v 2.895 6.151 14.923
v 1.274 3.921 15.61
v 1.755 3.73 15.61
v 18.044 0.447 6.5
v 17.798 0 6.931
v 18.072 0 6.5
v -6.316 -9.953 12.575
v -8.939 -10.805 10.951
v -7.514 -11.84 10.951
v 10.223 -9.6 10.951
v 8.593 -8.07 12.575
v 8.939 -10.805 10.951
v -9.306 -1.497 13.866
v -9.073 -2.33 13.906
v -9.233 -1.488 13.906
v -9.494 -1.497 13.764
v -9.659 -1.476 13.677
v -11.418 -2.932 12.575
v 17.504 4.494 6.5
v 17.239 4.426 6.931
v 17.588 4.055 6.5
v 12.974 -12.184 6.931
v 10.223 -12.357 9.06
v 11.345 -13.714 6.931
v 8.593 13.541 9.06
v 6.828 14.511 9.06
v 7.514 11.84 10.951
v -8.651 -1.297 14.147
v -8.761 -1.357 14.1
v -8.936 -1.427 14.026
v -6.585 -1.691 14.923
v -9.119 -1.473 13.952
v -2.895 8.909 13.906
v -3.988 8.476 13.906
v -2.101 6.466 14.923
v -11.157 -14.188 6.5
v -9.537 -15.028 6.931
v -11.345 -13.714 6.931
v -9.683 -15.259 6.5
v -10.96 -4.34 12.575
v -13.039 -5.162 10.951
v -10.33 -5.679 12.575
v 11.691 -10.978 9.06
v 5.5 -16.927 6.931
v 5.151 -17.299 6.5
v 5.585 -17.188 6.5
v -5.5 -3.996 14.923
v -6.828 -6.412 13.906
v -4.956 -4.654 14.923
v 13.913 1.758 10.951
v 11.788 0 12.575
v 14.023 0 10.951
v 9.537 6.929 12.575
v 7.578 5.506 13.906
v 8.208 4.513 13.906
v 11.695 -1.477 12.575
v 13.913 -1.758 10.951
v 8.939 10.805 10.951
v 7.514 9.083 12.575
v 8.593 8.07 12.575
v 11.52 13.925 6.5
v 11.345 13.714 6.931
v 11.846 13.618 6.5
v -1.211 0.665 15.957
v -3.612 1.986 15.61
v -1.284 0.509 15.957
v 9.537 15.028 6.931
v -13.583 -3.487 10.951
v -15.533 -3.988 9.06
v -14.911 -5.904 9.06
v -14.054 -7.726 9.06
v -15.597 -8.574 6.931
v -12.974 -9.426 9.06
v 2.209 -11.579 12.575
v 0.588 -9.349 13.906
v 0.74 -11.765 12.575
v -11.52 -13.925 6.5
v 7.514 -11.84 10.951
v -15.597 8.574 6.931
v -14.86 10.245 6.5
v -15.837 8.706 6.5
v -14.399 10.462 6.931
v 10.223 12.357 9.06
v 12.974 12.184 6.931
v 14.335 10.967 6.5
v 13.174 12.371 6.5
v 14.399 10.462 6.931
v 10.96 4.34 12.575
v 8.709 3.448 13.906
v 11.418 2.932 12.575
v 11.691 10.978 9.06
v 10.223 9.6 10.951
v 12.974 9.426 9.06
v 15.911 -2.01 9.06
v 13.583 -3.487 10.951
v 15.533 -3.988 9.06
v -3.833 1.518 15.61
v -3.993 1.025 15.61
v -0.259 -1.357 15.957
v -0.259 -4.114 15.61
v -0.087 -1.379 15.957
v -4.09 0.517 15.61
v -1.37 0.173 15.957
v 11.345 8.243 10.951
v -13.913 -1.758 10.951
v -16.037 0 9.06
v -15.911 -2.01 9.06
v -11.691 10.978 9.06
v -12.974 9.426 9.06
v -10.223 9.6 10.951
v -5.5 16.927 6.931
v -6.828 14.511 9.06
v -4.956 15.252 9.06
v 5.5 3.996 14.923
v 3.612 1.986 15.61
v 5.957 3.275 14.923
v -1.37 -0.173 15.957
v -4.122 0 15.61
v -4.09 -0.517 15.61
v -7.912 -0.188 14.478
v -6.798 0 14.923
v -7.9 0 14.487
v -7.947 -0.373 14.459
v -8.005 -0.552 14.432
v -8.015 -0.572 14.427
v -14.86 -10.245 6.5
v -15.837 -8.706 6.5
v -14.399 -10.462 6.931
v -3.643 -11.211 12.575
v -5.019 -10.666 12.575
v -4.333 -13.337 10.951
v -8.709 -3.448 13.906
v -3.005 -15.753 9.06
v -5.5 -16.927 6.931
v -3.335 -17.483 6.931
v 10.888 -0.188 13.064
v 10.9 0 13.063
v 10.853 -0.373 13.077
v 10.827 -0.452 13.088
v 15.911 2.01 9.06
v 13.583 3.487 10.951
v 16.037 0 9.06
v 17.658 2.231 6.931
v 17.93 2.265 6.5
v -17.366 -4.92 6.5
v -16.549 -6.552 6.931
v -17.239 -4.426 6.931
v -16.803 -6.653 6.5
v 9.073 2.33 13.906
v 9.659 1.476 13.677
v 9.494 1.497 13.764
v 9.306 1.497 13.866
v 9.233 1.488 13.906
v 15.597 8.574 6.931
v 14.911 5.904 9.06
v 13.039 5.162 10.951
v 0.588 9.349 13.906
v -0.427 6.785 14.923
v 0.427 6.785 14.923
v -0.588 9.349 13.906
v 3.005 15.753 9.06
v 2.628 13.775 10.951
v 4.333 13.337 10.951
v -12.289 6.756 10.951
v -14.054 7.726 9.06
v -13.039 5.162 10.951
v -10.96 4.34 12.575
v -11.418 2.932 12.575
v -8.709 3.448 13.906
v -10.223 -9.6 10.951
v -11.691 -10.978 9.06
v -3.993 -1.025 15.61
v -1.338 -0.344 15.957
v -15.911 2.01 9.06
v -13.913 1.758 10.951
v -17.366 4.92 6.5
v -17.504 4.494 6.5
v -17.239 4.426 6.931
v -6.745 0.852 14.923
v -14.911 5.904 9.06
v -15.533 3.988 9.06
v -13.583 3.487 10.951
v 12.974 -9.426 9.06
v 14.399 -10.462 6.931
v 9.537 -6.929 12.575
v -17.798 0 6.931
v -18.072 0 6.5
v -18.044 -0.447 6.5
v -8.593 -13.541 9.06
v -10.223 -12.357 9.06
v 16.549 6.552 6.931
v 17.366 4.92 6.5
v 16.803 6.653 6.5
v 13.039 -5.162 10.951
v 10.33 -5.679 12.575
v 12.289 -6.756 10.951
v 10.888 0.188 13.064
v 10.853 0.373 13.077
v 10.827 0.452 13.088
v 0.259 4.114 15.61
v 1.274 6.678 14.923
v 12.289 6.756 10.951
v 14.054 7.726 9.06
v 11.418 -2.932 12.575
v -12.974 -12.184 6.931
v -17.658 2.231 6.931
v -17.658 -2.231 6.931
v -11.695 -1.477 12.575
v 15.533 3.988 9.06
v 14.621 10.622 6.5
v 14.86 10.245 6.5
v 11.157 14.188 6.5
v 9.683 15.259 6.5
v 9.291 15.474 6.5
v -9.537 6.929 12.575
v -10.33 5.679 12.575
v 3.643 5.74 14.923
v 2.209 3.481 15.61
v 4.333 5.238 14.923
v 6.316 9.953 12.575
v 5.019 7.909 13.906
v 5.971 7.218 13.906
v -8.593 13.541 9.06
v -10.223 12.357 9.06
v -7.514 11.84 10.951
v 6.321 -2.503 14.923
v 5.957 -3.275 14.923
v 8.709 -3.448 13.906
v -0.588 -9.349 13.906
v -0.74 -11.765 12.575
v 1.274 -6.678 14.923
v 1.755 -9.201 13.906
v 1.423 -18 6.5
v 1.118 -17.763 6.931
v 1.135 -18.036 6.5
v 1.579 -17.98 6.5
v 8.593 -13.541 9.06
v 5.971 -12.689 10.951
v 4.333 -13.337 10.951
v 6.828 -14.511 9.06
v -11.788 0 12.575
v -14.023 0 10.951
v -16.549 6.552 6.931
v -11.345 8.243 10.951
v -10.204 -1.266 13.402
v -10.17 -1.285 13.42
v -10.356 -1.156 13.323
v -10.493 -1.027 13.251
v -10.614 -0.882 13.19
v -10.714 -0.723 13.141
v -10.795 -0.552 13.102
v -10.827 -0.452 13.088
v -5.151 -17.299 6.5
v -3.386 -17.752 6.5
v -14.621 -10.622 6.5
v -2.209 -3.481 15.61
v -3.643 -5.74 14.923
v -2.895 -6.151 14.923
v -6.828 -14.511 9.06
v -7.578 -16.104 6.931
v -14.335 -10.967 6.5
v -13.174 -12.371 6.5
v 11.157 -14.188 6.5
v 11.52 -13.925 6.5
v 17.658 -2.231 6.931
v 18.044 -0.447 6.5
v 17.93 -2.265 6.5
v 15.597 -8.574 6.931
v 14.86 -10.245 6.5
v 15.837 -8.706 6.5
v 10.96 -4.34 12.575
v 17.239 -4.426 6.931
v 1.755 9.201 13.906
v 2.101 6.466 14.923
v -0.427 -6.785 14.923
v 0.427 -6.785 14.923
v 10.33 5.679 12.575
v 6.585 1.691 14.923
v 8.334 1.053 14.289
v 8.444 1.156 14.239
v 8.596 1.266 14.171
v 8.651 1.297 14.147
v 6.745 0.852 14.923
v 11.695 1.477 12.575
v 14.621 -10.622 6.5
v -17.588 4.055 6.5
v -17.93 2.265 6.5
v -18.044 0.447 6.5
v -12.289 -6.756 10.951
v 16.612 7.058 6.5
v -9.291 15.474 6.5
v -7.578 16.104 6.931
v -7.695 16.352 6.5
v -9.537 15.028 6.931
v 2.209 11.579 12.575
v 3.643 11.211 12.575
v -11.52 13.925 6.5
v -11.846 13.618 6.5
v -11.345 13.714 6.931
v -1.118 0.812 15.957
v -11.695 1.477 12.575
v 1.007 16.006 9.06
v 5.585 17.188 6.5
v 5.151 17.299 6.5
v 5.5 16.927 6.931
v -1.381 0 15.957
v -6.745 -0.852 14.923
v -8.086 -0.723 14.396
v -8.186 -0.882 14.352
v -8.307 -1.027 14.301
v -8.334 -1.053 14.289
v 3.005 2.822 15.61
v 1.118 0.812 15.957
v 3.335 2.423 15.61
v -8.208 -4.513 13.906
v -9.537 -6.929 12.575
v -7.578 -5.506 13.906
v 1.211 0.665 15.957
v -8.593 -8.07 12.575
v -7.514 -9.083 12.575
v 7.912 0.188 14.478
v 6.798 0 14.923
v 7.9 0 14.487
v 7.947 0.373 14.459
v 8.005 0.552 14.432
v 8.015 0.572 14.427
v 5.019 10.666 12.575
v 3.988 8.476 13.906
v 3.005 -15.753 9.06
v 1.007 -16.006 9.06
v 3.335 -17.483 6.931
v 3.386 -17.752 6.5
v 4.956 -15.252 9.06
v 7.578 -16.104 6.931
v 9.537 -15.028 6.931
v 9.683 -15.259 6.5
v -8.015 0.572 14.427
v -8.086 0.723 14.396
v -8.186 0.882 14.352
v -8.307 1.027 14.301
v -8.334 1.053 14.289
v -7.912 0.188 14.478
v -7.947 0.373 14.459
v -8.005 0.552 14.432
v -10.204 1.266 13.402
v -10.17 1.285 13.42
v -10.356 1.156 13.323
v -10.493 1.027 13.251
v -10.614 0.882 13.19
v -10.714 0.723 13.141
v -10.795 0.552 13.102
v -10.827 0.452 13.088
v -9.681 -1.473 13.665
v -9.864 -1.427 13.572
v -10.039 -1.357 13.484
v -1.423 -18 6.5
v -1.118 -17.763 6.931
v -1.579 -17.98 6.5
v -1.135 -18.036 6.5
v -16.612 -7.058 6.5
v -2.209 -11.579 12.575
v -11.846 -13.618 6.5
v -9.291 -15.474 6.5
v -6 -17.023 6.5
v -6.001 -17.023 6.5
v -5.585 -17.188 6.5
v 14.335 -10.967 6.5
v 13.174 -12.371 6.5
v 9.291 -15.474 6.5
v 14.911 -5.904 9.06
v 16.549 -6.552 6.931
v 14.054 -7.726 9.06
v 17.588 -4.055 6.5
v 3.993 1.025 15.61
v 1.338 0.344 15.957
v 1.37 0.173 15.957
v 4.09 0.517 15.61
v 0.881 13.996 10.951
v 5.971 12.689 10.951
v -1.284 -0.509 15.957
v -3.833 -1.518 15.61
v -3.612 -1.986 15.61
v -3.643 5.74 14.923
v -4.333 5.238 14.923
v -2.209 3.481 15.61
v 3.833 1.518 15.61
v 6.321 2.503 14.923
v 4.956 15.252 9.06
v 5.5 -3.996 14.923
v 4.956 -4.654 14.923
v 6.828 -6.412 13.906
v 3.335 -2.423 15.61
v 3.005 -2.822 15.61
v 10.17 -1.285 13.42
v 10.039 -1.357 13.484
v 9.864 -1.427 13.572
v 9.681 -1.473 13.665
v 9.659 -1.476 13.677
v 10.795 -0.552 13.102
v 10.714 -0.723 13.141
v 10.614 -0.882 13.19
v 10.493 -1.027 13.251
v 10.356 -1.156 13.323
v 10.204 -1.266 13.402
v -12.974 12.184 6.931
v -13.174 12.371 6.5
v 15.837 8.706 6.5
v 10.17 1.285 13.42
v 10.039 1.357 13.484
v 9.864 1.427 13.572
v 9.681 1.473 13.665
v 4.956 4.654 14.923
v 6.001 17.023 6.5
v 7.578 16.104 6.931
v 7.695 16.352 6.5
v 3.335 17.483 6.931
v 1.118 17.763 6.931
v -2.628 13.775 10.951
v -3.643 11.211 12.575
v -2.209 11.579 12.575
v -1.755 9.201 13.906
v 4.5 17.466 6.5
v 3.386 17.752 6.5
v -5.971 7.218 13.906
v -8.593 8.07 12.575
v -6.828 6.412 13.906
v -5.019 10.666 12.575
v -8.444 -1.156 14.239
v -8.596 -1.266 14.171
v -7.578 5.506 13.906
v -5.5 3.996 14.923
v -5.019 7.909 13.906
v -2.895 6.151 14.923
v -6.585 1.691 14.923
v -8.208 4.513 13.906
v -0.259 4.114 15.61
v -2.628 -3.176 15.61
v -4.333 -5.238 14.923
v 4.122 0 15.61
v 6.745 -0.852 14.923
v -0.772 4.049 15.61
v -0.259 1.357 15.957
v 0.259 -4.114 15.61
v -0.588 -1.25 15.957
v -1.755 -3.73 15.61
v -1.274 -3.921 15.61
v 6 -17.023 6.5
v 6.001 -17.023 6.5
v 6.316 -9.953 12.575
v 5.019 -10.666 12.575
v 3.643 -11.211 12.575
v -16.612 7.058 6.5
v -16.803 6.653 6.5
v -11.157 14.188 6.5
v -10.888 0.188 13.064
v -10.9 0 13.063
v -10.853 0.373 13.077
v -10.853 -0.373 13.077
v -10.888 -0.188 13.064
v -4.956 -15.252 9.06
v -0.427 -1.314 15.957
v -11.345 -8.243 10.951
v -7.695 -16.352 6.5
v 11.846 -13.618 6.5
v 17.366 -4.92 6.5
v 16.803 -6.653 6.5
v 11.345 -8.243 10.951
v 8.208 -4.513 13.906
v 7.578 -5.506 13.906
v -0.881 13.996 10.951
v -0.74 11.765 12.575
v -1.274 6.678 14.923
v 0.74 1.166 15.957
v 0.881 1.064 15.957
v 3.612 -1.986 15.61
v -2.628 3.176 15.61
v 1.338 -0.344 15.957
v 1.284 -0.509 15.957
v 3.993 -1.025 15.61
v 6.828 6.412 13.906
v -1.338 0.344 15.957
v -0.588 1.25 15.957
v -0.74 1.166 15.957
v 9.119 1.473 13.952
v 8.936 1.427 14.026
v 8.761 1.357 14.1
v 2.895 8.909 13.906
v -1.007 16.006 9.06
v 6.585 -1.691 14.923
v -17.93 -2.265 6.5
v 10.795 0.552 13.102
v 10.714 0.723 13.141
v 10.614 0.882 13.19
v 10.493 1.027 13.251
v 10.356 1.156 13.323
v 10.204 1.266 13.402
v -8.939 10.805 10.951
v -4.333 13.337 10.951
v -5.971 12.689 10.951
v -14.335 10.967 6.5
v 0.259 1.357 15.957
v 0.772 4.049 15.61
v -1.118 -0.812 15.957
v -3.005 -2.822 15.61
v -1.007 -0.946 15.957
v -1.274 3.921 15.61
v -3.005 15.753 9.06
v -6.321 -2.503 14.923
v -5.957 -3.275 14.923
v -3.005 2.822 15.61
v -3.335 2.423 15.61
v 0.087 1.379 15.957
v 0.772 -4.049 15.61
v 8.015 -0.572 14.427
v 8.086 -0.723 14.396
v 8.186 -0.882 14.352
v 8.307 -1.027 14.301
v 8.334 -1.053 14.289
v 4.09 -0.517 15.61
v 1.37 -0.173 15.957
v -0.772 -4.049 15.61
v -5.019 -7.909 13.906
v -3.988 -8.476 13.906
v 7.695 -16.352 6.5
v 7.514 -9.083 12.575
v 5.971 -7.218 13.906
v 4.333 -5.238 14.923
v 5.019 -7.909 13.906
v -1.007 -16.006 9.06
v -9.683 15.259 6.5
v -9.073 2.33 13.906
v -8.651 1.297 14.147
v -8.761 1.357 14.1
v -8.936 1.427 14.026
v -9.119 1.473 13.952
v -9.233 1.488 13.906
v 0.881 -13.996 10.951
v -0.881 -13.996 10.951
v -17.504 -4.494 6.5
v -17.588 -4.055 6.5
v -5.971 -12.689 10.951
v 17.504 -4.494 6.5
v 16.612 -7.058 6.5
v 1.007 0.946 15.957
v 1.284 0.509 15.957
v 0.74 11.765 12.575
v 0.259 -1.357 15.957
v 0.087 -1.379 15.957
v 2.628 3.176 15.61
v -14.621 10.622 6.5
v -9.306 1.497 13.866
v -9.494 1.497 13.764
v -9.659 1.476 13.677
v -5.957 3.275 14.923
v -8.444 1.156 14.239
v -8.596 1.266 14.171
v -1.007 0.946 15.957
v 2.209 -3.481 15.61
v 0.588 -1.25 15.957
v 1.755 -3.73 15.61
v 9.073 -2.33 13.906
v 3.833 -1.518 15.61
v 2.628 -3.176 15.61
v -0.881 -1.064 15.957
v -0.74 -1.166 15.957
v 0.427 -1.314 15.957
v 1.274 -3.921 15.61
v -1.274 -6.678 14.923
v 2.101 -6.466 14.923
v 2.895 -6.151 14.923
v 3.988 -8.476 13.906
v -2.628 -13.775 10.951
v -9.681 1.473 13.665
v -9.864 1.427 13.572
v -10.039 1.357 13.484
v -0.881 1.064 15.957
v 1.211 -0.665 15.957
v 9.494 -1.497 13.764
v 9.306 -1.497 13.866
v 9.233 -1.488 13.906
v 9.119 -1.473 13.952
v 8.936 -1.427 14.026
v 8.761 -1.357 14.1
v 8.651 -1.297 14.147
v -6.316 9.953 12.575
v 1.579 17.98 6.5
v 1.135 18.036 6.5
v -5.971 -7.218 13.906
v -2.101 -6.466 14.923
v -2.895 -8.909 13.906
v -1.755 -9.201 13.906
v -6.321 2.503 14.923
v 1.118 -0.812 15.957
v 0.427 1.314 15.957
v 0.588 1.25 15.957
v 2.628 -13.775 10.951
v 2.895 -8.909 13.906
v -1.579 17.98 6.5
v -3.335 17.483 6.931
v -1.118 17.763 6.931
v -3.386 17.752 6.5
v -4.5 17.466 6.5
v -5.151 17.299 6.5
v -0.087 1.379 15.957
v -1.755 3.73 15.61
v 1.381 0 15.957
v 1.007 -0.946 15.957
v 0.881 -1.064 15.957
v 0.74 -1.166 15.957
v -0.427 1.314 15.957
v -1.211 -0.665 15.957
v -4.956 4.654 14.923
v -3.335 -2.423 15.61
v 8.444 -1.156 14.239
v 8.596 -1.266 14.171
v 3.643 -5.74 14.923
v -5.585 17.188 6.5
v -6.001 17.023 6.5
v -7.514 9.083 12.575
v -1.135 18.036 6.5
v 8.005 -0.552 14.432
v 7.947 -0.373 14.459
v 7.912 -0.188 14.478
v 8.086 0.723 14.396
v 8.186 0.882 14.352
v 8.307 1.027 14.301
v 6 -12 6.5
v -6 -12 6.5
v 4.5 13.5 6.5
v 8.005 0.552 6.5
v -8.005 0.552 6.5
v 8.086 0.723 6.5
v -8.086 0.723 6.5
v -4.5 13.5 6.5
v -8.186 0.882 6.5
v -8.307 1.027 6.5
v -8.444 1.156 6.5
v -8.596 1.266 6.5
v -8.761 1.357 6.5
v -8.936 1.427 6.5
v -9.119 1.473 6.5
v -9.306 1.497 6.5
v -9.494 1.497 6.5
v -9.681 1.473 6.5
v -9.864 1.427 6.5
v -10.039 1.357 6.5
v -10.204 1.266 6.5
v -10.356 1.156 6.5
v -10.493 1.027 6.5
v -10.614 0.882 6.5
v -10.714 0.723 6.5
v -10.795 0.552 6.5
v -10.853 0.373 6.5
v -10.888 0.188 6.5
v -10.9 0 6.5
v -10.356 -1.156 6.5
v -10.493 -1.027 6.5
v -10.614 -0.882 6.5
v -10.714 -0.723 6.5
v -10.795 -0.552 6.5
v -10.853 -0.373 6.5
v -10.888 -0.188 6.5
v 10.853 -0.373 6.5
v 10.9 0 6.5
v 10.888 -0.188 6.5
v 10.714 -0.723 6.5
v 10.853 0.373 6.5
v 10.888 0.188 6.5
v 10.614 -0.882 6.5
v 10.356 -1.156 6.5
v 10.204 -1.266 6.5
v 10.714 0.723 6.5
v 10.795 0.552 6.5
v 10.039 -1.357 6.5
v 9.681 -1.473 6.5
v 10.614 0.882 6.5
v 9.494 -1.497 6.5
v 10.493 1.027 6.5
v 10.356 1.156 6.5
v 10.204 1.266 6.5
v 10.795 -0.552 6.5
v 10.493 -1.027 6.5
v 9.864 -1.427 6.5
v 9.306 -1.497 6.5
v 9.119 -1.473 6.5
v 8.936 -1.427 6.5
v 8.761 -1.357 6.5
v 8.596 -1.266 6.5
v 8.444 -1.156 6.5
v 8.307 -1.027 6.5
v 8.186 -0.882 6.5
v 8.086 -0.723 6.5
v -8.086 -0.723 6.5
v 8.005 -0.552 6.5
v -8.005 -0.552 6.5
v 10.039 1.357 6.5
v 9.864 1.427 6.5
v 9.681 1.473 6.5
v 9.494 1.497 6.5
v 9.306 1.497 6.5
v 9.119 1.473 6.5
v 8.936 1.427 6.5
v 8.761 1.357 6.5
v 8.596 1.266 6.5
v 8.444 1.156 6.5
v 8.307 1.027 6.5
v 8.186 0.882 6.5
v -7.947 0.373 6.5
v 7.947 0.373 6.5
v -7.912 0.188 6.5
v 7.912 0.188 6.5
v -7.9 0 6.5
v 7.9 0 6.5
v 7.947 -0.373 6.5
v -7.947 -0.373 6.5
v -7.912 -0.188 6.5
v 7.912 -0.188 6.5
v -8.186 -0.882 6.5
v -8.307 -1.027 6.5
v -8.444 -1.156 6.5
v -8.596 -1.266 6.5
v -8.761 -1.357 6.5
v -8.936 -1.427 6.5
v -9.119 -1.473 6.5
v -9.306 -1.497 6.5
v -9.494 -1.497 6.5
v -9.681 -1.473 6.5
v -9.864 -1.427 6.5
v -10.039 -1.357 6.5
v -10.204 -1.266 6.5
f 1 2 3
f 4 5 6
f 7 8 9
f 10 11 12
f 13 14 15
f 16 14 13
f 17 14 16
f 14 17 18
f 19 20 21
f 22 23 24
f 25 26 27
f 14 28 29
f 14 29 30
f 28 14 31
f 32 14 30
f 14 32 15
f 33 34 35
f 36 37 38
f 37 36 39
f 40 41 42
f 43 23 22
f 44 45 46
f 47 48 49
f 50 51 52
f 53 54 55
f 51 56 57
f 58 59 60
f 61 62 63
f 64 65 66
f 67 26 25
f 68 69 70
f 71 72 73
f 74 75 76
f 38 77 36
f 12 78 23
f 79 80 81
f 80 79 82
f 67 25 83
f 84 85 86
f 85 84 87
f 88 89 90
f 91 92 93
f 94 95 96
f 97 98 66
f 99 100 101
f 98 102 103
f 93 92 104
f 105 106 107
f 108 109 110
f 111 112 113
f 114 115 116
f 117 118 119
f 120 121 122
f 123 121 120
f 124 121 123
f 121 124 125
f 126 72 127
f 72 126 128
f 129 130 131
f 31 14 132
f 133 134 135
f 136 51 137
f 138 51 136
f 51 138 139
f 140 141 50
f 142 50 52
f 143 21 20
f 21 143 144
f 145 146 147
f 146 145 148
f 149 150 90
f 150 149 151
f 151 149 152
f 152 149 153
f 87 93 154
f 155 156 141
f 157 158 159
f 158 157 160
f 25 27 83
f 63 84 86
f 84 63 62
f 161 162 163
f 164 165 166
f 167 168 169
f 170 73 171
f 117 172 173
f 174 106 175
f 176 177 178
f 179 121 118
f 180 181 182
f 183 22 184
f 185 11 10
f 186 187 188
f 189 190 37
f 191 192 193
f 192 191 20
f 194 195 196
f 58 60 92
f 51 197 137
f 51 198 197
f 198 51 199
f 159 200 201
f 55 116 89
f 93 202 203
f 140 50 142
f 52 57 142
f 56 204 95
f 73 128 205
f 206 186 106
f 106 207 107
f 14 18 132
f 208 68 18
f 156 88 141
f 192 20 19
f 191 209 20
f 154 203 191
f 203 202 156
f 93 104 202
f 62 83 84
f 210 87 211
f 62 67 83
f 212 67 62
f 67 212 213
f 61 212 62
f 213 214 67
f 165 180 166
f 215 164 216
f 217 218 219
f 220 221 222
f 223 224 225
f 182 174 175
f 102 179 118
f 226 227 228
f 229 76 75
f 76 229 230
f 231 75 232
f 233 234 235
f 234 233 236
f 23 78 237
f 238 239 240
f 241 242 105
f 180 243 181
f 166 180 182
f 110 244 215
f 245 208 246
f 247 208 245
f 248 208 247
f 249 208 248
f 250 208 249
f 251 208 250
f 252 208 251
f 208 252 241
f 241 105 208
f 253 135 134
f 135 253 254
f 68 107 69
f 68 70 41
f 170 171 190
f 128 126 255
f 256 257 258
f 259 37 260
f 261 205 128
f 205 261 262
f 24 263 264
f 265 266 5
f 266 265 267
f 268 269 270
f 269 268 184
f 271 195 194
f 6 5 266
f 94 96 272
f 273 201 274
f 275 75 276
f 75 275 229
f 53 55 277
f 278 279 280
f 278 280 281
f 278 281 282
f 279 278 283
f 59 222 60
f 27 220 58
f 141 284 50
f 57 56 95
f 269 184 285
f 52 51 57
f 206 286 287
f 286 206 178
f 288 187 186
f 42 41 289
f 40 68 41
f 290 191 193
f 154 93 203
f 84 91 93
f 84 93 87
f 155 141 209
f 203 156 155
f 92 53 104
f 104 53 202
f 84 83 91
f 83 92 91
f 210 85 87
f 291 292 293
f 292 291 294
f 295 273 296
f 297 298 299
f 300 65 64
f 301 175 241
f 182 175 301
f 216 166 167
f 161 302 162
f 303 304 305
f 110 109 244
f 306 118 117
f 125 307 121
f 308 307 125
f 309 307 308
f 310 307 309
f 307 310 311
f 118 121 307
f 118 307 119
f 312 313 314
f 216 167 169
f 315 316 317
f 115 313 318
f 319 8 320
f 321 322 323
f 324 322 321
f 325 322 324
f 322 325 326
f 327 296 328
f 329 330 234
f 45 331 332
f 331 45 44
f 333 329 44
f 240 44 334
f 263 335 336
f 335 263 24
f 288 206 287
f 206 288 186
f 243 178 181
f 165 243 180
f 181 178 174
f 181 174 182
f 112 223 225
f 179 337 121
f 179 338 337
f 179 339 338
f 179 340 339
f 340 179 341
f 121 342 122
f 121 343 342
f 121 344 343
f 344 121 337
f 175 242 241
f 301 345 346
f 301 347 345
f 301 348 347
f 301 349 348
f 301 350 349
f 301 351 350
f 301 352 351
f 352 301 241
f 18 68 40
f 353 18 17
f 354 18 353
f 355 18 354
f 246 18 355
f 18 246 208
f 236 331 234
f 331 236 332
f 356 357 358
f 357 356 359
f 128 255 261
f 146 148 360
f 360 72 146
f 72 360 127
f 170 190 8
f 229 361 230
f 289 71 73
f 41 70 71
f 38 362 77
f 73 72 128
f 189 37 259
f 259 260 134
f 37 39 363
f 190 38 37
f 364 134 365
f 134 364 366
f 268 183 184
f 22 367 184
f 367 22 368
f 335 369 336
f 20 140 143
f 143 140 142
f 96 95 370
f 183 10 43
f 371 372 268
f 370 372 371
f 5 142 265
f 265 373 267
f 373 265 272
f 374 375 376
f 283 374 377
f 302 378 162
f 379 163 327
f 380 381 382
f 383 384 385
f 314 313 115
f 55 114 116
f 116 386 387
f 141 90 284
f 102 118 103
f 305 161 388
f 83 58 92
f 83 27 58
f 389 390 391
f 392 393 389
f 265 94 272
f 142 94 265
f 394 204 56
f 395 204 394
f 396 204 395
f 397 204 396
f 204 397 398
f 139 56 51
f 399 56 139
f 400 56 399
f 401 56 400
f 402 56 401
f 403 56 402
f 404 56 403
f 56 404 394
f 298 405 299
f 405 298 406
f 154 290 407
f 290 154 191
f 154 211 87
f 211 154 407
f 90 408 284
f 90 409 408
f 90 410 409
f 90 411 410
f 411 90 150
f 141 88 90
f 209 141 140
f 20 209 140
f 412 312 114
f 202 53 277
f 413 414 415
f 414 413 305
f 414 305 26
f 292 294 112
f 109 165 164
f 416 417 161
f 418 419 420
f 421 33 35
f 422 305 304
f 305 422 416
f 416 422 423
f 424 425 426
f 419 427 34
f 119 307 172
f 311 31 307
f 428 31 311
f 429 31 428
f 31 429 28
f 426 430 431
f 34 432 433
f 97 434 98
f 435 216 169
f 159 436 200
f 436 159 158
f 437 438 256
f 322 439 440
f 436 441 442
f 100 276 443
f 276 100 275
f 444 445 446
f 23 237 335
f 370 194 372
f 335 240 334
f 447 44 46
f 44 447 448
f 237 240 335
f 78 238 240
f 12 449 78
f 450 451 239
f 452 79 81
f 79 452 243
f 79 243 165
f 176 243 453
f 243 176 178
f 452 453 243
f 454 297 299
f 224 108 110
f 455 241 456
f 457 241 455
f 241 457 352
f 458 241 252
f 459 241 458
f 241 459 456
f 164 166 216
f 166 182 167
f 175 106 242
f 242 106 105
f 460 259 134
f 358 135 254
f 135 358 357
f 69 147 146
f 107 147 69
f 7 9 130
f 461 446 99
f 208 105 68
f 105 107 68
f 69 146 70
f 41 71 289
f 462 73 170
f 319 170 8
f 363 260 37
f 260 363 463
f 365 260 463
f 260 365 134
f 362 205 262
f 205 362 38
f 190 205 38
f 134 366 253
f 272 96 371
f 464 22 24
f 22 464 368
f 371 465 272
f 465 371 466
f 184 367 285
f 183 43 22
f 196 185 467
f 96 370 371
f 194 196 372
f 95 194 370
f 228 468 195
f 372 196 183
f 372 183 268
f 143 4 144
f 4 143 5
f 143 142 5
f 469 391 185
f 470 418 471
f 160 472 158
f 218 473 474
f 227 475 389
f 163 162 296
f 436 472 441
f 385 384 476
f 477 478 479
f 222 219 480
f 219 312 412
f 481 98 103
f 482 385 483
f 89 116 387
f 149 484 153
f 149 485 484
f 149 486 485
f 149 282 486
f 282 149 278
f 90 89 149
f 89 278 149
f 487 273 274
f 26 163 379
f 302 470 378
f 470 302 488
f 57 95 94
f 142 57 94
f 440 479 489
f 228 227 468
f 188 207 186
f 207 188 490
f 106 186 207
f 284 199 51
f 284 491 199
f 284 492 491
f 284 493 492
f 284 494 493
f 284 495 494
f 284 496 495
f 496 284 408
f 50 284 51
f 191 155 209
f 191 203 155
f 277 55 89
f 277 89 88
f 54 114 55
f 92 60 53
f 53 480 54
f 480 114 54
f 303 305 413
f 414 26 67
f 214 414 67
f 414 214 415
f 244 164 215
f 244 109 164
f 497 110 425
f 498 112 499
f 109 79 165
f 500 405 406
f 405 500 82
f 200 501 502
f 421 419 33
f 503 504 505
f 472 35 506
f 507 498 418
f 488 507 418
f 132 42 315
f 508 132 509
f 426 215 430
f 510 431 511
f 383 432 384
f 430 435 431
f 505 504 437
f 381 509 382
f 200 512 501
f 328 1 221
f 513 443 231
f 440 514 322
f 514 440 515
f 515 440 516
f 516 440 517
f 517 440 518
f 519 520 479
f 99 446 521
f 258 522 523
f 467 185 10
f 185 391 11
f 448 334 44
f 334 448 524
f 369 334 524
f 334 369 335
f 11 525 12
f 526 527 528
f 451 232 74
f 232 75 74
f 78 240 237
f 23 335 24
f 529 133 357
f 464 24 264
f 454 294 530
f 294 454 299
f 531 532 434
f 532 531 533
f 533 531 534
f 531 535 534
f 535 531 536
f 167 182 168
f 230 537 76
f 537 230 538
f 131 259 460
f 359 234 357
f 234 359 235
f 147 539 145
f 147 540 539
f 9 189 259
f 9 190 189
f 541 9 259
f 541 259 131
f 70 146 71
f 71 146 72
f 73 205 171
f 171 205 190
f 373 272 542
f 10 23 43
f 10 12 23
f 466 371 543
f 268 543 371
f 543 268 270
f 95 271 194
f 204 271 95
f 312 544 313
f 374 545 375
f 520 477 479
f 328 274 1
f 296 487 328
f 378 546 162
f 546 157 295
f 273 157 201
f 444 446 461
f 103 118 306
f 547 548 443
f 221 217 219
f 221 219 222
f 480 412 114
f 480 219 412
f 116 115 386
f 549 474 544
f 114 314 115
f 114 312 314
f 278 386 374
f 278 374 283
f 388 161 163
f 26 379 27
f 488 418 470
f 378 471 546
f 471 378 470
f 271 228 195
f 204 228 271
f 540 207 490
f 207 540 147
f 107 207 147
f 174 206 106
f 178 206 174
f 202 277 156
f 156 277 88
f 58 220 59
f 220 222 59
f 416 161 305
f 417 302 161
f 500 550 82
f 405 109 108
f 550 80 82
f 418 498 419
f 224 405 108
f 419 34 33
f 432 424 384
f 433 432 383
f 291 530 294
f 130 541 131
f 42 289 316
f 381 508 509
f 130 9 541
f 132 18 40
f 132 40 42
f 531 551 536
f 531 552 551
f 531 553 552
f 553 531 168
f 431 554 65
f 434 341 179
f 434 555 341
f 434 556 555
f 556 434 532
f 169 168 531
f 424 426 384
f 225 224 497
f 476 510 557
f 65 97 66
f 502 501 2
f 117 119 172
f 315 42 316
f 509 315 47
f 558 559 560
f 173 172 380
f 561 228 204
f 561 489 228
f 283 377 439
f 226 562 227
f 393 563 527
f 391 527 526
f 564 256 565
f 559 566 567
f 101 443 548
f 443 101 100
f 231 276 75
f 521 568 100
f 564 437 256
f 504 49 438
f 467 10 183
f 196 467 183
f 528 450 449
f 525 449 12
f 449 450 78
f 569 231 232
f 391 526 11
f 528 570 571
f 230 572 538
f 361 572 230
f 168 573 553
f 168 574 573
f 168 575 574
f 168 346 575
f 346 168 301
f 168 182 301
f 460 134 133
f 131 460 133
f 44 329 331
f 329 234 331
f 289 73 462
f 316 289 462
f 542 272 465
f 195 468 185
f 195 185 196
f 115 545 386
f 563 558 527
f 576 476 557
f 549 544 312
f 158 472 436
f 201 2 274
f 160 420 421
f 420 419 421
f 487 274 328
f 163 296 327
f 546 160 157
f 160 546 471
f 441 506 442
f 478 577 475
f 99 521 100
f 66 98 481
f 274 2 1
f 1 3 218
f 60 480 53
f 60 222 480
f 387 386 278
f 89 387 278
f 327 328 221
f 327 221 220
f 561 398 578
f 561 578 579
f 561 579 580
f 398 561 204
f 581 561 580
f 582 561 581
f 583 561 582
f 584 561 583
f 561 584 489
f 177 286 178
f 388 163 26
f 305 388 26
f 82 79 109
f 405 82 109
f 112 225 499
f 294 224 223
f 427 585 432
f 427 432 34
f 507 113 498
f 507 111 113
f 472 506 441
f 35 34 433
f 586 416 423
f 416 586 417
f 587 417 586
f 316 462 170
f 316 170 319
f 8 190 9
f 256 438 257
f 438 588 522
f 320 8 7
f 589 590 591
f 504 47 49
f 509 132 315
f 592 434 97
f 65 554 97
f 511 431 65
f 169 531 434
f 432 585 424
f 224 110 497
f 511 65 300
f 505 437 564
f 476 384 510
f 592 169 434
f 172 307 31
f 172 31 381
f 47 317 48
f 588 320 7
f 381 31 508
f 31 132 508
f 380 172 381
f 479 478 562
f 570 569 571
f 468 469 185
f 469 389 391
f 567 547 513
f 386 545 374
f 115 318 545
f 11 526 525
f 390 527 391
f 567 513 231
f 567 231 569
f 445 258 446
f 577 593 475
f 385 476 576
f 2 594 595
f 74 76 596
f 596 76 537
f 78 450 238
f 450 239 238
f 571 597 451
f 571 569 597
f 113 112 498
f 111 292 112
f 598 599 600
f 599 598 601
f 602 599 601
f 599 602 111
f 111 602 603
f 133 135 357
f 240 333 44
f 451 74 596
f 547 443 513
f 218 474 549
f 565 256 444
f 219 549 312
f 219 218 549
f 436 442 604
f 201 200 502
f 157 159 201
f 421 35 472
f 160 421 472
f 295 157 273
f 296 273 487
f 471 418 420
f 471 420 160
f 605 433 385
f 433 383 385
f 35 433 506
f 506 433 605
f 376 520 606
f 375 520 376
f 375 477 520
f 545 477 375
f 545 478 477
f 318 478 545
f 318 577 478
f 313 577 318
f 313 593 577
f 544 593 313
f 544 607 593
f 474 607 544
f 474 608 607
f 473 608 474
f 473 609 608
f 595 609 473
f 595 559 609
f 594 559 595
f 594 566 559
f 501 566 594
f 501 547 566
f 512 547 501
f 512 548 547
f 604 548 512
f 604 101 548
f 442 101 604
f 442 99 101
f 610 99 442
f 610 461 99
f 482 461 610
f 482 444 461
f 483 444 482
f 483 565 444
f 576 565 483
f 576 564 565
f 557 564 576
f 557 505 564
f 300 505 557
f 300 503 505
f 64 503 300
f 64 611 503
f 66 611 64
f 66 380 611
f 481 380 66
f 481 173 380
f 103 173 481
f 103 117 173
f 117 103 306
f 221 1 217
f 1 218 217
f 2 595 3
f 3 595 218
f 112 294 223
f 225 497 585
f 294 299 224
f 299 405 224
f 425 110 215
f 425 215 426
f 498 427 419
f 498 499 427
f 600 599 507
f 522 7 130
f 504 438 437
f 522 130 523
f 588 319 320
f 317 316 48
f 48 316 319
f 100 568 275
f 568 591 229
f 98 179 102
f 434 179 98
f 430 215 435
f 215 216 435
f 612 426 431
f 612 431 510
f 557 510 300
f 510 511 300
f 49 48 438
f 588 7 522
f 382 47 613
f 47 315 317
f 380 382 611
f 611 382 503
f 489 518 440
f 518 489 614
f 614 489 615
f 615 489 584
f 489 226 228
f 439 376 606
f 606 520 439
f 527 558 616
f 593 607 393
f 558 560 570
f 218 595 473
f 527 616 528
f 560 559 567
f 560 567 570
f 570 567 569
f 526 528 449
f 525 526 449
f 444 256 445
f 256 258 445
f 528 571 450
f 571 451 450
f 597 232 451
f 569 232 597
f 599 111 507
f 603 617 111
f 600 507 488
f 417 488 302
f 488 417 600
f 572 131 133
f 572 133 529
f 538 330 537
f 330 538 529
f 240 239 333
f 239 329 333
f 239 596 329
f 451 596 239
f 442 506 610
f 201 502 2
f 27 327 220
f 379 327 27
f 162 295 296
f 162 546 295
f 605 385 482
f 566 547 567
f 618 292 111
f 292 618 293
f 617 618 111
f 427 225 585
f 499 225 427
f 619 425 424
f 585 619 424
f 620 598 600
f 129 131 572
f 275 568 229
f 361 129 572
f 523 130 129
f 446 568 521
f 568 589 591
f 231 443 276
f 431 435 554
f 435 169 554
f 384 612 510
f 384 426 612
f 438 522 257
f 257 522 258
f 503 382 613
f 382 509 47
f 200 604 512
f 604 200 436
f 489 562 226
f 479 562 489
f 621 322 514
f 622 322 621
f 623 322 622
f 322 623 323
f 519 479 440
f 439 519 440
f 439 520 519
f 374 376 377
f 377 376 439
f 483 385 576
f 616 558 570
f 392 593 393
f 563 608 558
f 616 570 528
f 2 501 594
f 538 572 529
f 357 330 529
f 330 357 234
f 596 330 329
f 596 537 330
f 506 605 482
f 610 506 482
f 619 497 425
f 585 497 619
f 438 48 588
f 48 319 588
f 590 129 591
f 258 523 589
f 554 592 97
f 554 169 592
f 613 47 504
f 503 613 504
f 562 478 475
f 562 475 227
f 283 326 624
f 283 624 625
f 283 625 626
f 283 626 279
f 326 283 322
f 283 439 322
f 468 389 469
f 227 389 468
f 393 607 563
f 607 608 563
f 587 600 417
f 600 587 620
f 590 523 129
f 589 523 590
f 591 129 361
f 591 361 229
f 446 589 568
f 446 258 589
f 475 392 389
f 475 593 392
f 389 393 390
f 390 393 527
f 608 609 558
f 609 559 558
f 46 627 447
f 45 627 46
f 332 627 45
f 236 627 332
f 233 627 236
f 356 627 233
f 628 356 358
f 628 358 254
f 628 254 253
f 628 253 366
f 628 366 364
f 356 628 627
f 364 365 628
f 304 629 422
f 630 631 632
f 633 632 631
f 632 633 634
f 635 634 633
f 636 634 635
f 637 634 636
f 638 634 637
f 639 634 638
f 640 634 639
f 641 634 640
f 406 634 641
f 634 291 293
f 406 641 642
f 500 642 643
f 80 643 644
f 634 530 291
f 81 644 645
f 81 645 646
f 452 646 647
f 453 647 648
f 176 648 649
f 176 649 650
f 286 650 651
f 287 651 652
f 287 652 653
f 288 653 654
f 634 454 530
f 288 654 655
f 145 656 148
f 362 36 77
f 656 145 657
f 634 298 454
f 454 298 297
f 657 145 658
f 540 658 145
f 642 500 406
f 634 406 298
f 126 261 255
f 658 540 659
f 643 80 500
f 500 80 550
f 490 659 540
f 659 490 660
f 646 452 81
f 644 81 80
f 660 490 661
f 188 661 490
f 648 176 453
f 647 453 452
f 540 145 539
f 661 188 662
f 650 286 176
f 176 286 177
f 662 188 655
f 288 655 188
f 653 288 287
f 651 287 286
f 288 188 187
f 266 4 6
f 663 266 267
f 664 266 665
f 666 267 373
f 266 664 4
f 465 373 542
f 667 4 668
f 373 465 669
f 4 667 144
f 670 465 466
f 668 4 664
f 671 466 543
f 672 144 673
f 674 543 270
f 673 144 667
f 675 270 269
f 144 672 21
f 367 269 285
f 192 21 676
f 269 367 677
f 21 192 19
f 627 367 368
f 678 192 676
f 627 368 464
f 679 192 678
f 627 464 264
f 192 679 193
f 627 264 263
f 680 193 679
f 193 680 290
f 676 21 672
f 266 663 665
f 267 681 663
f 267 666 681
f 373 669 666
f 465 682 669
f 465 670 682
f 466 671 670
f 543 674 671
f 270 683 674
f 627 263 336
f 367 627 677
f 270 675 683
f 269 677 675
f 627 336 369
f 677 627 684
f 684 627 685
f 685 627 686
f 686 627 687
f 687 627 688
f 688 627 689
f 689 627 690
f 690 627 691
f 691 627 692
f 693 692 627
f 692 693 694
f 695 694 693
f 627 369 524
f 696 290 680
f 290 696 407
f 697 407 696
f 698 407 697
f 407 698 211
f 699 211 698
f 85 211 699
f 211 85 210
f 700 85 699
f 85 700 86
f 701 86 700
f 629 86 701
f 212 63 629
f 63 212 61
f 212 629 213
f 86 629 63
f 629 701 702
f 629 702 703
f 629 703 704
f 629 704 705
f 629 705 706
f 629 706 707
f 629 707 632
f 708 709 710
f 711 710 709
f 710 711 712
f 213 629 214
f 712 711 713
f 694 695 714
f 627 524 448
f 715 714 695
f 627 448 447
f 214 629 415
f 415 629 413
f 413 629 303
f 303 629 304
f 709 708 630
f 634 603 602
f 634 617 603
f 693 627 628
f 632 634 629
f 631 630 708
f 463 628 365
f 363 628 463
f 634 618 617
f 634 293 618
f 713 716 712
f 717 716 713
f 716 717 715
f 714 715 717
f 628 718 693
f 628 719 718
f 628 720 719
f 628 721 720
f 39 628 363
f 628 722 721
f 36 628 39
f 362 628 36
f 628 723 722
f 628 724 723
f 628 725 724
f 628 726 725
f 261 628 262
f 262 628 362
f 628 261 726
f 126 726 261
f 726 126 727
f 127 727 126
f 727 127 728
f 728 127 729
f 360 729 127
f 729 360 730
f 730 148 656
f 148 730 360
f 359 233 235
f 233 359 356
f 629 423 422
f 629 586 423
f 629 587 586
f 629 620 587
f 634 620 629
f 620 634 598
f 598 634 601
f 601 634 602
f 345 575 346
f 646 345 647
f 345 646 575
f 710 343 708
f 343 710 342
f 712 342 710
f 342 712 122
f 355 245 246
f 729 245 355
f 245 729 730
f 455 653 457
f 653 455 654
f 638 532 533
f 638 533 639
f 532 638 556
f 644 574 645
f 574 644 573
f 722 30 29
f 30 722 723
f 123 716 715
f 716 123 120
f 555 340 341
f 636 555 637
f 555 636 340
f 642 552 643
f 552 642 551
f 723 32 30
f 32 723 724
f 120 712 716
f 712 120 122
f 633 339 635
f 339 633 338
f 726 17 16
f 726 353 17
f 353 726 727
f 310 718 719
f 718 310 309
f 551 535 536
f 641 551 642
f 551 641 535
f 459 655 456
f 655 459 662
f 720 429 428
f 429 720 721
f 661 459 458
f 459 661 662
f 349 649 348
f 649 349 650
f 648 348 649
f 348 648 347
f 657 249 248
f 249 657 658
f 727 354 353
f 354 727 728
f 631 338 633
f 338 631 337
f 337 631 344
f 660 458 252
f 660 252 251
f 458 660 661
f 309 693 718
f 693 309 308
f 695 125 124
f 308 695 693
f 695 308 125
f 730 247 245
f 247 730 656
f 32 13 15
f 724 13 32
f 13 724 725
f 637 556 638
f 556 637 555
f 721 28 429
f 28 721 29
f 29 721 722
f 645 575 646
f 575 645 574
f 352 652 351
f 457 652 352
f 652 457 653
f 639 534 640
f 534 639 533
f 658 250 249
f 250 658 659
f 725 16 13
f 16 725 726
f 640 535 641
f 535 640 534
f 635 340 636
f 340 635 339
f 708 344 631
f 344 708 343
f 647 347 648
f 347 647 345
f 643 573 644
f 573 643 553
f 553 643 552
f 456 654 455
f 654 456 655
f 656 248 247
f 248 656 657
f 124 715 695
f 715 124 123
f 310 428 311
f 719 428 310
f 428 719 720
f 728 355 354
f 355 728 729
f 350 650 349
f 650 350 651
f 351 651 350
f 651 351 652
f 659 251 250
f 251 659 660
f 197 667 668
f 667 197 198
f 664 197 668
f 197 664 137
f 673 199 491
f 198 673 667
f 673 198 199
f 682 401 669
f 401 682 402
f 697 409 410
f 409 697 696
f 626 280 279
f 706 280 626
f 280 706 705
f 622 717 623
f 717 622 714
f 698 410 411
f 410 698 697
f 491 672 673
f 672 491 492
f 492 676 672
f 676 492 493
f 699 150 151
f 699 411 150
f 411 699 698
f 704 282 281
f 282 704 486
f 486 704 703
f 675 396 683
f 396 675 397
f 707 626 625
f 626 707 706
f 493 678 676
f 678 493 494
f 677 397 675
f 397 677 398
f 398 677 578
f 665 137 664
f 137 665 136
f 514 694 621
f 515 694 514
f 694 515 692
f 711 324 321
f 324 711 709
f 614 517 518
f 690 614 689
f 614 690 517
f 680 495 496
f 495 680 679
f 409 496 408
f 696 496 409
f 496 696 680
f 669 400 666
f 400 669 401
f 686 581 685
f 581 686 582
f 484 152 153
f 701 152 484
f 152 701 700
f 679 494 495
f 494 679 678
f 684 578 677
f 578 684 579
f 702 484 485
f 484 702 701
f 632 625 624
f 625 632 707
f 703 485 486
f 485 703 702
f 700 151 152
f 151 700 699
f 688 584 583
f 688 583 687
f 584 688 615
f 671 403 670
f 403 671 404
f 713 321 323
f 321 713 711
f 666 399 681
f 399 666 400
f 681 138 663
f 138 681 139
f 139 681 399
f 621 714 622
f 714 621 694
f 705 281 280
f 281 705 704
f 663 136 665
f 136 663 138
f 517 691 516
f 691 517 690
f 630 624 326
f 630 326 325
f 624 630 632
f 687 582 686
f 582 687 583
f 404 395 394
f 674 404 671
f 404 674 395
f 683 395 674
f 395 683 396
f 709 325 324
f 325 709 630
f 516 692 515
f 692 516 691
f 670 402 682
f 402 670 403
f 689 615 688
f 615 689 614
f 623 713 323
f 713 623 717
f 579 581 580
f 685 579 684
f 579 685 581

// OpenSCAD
// file: parts.scad
module hemisphere() {
  translate([0,0,-6]) {
    difference() {
      sphere(r=22, center=true, $fn=facets);
      translate([0,0,-19]) {
        cube([60,60,50],center=true);
      }
    }
  }
}

module mount_holes() {
  union() {
    translate([-9.4, 0, 0]) {
      cylinder(r=1.5, h=20, $fn=facets);
    }

    translate([+9.4, 0, 0]) {
      cylinder(r=1.5, h=20, $fn=facets);
    }
  }
}

module navigation_switch() {
  base_width=11.0;
  base_length=11.0;
  base_height=3.65;
  stick_lower_height=3.4; // 4.4 really
  stick_upper_width=3.17;
  stick_upper_length=3.16;

  union() {
    // base
    translate([-(base_width/2), -(base_length/2), 0])
      cube([base_width, base_length, base_height]); // no nubs
    // stick lower
    translate([0,0,base_height])
      cylinder(d=7.5, h=stick_lower_height, $fn=facets);
    // stick upper
    translate([-(stick_upper_width/2),-(stick_upper_length/2),base_height+stick_lower_height])
      cube([stick_upper_width, stick_upper_length, 4.4]);
  }
}

module button() {
  base_width = 8.0; // including leads
  base_length = 7.1;
  base_height = 4; // including nubs
  button_height = 2;
  button_width = 4;

  union() {
    // base
    translate([-(base_width/2), -(base_length/2), 0])
      cube([base_width, base_length, base_height]); // no nubs
    // button
    translate([0,0,base_height])
      cylinder(d=button_width, h=button_height, $fn=facets);
  }
}

module slim_button() {
  base_width = 8.0; // including leads
  base_length = 4;
  base_height = 4; // including nubs
  button_height = 2;
  button_width = 3;

  union() {
    // base
    translate([-(base_width/2), -(base_length/2), 0])
      cube([base_width, base_length, base_height]); // no nubs
    // button
    translate([0,0,base_height])
      cylinder(d=button_width, h=button_height, $fn=facets);
  }
}

module power_sw() {
  base_width = 12;
  base_length = 5;
  base_height = 6; // including nubs

  switch_height = 5;
  switch_width = 7;
  switch_length = 3;
  switch_x_offset = -3.5;
  switch_y_offset = -1.5;

  union() {
    // base
    translate([-(base_width/2), -(base_length/2), 0])
      cube([base_width, base_length, base_height]); // no nubs
    // switch
    translate([switch_x_offset,switch_y_offset,base_height])
      cube([switch_width, switch_length, switch_height]);
  }
}

module micro_usb_board() {
  board_width = 21.5;
  board_length = 12;
  board_height = 2;

  connector_height = 3;
  connector_width = 9;
  connector_length = 11.5;
  connector_x_offset = -4.5;
  connector_y_offset = 0.5;
  connector_z_offset = 1.50;

  mount_hole_diameter = 3.5;
  mount_hole_x_offset = 7.5;
  mount_hole_y_offset = 3.5;

  union() {
    // base
    translate([-(board_width/2), -(board_length/2), 0])
      cube([board_width, board_length, board_height]);
    // button
    translate([connector_x_offset,connector_y_offset,connector_z_offset])
      cube([connector_width, connector_length, connector_height]);
  }
}
// main file
include <parts.scad>;

facets = 50;

// navigation_switch();
// button();
// slim_button();
// power_sw();
// micro_usb_board();

// difference() {
//   hemisphere();
//   mount_holes();
// }

// difference() {
//   difference() {
//     difference() {

//       difference() {
//         difference() {
//           difference() {
//             difference() {
//               hemisphere();
//               translate([0,-12,4]) {
//                 rotate([90,0,0]) {
//                   power_sw();
//                 }
//               }
//             }
//             translate([0,13,2]) {
//               rotate([0,0,0]) {
//                 micro_usb_board();
//               }
//             }
//           }
//           translate([-25,-25,-8]) {
//             cube([50, 50, 12]);
//           }
//         }
//         translate([-25,-25,6]) {
//           cube([50, 50, 12]);
//         }
//       }

//       mount_holes();
//     }
//     translate([-5,-4.9,0]) {
//       // access
//       cube([10,10,4]);
//     }
//   }
//   translate([-5,-12.5,2]) {
//       // channel
//       cube([10,29.5,2]);
//     }
// }



module control_pod() {
  difference() {
    difference() {
      difference() {
        difference() {
          difference() {
            hemisphere();
            translate([0,-12,4]) {
              rotate([90,0,0]) {
                power_sw();
              }
            }
          }
          translate([0,13,2]) {
            rotate([0,0,0]) {
              micro_usb_board();
            }
          }
        }
        mount_holes();
      }
      translate([-5,-4.9,0]) {
        // access
        cube([10,10,4]);
      }
    }
    translate([-5,-12.5,2]) {
        // channel
        cube([10,29.5,2]);
      }
  }
}

module base_layer() {
  difference() {
    control_pod();
    translate([-25,-25,4]) {
      cube([50, 50, 20]);
    }
  }
}

module second_layer() {
  difference() {
    difference() {
      control_pod();
      translate([-25,-25,6.5]) {
        cube([50, 50, 20]);
      }
    }
    translate([-25,-25,-6]) {
      cube([50, 50, 10]);
    }
  }
}

module top_layer() {
  intersection() {
    control_pod();
    translate([-25,-25,6.5]) {
      cube([50, 50, 20]);
    }
  }
}

// base_layer();
// second_layer();
top_layer();
